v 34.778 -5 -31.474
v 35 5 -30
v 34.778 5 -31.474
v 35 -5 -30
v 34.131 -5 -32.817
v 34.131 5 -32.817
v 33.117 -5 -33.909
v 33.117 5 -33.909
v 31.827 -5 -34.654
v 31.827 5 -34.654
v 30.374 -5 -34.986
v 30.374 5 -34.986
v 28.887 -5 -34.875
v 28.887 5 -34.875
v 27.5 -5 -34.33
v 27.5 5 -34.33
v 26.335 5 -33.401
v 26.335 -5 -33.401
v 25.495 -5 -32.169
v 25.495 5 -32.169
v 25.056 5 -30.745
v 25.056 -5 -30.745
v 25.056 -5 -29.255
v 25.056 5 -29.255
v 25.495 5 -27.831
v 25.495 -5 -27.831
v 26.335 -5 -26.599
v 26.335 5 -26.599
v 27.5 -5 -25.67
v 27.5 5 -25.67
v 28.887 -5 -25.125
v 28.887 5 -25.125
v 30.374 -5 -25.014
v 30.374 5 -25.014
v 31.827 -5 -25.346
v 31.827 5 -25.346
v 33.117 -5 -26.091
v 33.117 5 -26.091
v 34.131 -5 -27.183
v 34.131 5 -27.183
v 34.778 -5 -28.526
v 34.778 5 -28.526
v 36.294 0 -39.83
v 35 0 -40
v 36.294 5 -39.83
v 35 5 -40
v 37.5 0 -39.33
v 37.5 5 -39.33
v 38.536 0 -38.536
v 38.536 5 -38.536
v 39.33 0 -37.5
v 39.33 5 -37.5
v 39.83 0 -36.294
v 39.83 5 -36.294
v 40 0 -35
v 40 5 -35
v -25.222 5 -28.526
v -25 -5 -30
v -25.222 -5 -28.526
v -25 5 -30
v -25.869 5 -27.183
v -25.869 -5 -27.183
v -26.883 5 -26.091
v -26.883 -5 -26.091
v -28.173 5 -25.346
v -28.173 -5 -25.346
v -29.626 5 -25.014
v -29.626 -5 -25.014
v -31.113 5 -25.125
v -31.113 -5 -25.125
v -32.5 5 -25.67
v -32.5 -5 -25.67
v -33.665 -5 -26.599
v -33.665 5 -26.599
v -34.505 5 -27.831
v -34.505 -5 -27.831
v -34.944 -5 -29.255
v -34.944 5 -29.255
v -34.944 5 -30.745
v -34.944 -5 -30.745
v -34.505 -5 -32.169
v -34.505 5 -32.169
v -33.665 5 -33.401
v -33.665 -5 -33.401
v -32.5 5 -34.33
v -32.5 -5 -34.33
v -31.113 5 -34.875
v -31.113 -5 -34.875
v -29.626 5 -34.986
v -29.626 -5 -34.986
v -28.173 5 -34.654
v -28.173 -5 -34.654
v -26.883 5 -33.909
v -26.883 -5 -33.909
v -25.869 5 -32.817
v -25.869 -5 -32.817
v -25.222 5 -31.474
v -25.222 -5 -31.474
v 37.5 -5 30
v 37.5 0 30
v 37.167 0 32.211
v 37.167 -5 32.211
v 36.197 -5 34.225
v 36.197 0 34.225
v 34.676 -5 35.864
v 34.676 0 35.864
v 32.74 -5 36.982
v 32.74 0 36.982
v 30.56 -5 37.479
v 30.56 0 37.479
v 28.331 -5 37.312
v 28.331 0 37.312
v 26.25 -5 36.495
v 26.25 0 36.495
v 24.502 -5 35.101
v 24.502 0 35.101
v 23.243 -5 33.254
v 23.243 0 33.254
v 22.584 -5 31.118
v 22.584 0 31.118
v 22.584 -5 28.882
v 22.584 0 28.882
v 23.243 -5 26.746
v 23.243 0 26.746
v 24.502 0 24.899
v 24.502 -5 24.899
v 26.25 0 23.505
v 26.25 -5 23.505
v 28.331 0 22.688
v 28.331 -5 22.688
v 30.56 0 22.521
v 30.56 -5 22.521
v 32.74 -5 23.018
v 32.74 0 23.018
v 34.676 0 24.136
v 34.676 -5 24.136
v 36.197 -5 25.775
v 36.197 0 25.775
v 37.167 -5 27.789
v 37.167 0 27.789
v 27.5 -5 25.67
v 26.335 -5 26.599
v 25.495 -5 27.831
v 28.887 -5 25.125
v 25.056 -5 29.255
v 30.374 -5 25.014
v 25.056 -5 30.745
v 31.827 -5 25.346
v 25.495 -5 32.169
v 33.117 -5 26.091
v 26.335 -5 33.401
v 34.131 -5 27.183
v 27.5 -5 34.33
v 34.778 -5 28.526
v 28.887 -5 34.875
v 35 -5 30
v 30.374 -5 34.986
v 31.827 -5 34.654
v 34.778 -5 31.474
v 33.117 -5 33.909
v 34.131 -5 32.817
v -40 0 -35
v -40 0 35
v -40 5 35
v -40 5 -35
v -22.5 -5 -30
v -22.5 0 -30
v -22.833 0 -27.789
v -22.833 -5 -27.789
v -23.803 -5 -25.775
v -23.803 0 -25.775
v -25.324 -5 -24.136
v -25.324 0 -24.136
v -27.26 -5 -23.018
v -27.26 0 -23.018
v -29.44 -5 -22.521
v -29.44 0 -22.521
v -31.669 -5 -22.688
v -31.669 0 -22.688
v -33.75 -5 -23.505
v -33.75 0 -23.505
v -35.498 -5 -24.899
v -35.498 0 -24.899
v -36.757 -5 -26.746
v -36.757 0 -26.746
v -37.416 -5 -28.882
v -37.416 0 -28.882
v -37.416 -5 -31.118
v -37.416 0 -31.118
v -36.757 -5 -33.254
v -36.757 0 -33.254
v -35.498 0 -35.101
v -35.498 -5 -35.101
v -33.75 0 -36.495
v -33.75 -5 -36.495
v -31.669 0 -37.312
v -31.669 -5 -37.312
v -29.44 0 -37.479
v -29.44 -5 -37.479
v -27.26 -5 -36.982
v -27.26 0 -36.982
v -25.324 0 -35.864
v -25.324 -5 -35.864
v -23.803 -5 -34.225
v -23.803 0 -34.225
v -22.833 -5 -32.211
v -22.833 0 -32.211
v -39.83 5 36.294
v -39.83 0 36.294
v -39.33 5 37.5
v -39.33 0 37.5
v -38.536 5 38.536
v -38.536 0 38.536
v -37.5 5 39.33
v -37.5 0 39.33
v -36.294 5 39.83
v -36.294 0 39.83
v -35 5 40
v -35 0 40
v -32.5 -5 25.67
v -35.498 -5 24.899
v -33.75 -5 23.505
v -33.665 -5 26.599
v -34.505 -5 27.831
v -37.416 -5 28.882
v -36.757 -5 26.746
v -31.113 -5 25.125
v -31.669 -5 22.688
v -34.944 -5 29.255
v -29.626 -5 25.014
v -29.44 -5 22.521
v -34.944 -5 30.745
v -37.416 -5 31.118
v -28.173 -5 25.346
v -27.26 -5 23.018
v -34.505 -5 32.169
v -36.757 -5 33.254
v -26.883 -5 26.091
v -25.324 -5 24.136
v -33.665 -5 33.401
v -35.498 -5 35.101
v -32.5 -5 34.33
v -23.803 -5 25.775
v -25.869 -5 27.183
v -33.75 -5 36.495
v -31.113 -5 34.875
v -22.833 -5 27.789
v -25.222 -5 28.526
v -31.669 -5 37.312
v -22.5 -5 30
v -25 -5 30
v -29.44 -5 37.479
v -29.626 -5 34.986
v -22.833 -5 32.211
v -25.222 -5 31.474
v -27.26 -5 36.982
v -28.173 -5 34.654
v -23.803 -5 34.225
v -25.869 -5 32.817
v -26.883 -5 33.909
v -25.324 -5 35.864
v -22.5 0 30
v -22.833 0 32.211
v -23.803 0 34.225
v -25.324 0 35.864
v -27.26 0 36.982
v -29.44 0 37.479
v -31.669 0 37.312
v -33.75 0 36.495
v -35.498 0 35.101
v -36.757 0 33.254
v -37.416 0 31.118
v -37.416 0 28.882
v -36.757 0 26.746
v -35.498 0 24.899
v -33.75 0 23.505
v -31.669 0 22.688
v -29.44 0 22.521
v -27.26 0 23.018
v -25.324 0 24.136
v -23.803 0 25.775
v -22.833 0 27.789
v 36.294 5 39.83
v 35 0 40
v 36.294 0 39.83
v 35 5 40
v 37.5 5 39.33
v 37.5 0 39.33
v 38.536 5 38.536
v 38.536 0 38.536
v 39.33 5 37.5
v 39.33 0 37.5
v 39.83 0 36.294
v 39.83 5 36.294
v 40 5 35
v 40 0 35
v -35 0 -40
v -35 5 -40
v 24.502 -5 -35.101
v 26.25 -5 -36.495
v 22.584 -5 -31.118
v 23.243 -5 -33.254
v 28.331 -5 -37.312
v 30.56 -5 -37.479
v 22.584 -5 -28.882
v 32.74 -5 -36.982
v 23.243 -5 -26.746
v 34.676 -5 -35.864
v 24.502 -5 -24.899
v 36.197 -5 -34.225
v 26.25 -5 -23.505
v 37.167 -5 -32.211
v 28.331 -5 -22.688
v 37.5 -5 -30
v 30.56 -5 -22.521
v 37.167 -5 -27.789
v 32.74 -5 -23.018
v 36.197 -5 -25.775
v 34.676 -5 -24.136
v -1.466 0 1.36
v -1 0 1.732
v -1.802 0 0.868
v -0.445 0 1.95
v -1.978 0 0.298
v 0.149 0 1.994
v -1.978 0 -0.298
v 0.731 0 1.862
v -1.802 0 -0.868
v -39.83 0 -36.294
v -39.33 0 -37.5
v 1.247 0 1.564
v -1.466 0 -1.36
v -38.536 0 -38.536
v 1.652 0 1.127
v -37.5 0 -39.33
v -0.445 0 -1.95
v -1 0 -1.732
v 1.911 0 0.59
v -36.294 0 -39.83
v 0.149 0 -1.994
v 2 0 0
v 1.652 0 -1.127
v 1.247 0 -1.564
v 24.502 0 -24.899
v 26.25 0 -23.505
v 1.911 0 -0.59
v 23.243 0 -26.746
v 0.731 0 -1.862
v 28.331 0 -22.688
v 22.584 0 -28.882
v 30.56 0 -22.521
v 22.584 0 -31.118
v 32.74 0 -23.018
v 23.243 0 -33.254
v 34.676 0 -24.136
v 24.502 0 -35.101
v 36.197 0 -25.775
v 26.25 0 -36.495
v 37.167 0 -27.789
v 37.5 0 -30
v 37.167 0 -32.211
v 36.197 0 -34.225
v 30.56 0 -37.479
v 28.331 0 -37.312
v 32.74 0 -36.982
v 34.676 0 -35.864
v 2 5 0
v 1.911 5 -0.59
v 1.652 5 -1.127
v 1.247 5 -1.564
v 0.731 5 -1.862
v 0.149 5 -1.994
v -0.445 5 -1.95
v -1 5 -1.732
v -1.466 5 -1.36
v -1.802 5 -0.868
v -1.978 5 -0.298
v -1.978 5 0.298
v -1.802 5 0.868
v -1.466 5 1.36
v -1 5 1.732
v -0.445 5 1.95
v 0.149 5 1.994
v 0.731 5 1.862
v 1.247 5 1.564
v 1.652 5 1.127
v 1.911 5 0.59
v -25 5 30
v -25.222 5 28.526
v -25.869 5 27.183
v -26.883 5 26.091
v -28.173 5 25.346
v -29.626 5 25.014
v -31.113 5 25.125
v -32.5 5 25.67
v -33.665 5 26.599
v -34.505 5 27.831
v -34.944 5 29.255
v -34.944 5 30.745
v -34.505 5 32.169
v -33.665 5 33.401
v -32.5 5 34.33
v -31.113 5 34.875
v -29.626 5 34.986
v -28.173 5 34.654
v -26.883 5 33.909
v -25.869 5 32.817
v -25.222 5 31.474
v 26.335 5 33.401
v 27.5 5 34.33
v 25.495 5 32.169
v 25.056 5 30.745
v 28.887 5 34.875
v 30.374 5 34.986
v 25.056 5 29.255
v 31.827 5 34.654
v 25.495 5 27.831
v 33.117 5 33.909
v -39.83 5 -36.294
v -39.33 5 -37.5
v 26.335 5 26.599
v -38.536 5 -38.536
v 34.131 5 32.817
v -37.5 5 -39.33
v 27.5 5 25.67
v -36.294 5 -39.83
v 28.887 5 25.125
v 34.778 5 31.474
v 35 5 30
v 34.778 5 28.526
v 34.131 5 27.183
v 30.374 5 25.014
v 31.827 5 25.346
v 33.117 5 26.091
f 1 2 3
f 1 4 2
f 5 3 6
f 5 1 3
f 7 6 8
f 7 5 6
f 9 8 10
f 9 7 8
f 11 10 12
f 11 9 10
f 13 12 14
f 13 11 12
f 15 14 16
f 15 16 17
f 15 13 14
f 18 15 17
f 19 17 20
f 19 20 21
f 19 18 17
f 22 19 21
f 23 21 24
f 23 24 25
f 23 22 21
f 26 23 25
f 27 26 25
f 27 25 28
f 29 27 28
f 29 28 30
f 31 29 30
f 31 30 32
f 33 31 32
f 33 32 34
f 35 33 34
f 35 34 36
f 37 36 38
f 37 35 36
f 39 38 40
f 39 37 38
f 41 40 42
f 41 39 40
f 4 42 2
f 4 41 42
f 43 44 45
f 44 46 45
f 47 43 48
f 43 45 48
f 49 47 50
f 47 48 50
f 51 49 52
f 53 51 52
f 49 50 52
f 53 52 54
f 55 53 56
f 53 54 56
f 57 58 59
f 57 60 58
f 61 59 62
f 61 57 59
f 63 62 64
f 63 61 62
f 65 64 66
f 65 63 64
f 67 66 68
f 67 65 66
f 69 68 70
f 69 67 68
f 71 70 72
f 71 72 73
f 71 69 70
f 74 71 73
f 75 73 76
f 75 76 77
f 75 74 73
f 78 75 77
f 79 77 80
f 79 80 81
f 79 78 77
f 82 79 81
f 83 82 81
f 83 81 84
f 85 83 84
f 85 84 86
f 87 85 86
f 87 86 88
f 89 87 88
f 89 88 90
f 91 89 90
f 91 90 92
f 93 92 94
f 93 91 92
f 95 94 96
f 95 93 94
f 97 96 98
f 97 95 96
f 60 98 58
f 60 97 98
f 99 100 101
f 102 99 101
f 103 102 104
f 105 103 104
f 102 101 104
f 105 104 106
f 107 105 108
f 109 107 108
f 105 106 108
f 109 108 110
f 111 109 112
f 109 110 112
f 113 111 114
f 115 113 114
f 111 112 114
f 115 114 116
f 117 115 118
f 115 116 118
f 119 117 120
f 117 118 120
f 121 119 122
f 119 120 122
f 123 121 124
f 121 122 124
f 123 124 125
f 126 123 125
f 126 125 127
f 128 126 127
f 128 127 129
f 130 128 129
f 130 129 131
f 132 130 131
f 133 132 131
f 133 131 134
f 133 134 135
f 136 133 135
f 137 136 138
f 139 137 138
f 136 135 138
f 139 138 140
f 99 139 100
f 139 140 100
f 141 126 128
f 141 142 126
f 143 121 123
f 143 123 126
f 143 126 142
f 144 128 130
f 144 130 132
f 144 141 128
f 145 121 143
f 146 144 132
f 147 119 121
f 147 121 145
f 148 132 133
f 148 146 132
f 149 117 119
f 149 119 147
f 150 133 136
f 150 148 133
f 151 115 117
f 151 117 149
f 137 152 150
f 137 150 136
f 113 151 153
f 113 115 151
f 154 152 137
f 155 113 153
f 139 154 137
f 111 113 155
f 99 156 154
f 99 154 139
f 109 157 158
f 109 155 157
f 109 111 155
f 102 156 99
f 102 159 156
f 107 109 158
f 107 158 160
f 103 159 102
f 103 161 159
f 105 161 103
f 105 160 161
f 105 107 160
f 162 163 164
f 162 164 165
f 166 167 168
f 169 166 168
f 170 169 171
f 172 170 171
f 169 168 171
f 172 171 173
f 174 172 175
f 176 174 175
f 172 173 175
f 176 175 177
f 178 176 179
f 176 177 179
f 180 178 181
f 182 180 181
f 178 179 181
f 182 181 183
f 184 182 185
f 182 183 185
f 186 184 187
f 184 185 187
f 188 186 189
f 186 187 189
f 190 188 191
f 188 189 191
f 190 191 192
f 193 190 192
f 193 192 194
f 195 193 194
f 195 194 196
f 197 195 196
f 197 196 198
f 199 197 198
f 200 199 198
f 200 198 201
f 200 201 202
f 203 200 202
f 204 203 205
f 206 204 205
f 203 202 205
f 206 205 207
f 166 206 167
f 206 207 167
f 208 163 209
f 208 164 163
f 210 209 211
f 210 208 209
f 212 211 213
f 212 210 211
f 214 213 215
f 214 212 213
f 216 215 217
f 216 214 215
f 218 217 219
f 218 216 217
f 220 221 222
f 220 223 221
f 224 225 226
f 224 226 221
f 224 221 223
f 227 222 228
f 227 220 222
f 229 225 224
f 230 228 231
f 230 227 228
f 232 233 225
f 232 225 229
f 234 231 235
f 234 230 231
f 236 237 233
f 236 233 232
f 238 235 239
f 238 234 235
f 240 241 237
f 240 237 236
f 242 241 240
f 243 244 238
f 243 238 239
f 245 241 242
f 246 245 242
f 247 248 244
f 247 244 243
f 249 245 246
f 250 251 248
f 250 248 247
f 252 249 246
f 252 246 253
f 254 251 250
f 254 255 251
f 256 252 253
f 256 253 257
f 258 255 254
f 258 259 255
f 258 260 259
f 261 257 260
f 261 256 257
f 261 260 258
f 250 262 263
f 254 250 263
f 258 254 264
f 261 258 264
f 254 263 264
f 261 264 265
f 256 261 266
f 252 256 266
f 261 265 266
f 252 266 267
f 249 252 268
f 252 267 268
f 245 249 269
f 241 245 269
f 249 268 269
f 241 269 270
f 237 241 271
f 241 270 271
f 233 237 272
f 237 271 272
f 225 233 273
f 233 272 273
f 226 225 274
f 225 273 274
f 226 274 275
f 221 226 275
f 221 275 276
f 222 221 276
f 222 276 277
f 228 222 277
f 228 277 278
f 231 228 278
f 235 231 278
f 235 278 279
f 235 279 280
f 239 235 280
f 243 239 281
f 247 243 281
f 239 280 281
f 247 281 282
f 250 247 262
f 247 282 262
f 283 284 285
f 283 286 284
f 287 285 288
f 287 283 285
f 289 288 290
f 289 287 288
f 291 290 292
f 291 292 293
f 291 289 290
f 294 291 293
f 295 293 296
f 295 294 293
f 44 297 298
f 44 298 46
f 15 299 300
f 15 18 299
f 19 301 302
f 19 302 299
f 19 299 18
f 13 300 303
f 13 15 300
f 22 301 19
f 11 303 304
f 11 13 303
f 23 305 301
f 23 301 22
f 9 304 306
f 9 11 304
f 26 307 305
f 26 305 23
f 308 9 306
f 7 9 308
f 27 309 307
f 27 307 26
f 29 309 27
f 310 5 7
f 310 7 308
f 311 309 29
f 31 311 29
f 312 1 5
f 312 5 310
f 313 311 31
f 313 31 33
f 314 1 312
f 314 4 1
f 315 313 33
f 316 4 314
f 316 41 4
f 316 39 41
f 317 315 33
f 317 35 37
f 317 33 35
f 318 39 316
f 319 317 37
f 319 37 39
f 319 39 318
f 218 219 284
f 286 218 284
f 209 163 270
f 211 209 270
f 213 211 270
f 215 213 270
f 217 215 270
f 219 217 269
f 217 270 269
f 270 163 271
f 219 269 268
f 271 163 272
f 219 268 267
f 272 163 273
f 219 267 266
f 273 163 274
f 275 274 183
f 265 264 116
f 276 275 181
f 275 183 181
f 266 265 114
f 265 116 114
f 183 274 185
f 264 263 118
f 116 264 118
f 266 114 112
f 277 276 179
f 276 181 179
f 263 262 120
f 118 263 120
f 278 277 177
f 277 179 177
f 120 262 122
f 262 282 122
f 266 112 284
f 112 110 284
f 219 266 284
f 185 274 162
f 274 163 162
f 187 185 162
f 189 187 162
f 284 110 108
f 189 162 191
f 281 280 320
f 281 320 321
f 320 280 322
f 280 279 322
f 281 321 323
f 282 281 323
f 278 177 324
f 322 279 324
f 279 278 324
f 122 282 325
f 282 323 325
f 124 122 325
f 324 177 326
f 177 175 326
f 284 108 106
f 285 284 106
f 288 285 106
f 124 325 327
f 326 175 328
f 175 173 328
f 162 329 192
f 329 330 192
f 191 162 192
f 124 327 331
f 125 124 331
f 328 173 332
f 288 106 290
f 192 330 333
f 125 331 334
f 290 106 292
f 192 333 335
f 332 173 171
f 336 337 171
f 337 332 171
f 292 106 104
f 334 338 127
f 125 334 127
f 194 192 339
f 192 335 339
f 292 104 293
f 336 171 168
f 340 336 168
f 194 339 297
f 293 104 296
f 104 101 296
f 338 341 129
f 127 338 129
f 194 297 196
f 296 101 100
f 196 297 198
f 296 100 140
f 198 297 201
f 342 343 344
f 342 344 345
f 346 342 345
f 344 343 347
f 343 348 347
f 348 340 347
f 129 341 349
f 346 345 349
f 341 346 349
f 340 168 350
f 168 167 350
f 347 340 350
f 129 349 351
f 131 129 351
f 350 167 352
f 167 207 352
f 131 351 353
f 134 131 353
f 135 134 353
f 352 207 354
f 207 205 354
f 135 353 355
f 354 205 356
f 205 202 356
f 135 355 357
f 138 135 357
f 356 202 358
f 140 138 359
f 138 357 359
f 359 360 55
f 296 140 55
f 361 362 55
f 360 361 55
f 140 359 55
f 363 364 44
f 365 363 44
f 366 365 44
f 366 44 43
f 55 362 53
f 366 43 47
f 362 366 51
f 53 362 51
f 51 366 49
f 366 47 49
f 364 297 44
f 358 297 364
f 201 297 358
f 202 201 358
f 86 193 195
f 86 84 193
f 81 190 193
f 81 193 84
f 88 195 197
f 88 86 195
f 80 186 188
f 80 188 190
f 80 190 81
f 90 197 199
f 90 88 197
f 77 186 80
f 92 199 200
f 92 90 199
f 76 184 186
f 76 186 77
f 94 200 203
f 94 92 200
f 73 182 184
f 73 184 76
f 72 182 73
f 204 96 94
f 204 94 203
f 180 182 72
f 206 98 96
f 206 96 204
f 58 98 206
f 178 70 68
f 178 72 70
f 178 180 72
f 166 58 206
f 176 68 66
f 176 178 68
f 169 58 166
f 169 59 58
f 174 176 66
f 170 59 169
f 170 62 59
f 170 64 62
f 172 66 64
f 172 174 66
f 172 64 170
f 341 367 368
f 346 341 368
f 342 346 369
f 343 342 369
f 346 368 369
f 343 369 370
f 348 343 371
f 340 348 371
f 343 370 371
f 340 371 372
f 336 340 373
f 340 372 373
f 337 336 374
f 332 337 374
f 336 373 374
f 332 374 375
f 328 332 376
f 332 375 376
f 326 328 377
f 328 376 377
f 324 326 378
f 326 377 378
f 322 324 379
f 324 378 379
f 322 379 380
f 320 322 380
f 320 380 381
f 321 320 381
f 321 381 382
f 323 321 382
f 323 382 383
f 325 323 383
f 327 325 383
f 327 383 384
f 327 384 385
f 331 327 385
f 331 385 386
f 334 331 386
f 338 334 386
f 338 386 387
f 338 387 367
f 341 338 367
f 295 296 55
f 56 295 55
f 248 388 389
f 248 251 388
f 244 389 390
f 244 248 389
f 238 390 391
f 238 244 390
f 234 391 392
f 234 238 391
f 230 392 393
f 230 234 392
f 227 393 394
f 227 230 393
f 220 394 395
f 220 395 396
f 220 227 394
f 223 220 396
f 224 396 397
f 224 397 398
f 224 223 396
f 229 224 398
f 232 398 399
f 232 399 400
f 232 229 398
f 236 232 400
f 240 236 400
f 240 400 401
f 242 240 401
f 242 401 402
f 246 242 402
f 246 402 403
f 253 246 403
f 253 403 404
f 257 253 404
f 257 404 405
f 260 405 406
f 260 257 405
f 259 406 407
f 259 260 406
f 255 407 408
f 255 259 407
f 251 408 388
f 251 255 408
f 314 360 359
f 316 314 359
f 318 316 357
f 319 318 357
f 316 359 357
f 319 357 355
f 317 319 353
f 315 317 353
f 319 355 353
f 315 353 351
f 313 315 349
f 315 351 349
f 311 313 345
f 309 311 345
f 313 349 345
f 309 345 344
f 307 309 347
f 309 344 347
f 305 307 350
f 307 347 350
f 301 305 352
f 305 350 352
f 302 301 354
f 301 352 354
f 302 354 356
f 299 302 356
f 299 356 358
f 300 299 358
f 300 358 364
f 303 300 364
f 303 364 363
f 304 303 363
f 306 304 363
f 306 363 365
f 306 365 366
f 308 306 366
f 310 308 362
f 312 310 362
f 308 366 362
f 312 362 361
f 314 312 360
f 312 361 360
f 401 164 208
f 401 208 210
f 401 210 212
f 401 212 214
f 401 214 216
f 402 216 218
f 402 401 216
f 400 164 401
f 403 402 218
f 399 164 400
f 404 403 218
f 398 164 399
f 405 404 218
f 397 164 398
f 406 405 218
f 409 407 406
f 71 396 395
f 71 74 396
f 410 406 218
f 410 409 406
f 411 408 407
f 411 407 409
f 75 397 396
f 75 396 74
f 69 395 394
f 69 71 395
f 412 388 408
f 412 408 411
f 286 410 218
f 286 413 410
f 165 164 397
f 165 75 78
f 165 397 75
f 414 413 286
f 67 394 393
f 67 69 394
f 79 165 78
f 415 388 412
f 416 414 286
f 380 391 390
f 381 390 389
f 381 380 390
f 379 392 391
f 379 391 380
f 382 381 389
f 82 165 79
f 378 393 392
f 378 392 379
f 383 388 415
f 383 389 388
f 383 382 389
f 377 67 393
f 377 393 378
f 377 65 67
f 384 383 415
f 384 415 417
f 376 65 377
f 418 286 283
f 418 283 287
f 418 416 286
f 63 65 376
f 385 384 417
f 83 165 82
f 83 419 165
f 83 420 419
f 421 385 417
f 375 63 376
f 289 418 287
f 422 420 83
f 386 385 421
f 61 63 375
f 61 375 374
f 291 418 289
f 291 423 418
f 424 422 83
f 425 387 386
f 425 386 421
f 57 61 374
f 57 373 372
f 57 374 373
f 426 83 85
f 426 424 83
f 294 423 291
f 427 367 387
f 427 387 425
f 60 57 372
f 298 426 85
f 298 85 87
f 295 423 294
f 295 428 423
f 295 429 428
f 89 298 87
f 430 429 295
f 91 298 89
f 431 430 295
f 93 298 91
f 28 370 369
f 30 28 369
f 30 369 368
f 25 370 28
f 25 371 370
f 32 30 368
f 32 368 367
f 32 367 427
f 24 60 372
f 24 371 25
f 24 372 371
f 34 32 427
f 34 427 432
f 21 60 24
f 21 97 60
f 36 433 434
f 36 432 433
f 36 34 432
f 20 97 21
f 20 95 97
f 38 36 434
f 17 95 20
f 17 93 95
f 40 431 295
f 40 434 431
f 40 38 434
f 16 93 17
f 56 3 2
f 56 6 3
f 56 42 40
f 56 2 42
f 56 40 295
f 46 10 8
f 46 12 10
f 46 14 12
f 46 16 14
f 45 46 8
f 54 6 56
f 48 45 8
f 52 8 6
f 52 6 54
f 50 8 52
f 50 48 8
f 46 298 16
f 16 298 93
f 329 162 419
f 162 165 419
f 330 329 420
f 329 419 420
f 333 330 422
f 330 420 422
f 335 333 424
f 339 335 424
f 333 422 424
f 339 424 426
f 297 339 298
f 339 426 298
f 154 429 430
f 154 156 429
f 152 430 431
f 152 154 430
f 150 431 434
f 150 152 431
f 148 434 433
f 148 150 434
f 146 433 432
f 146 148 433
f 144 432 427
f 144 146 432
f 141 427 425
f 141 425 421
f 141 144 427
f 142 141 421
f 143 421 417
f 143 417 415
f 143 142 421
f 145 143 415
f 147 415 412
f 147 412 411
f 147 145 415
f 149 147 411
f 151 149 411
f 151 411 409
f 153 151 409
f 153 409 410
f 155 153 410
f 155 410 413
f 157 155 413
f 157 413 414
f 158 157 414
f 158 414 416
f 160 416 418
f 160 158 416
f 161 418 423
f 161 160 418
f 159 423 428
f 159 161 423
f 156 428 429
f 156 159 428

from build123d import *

# Parameters (mm, degrees)
SKETCH1_W           = 80
SKETCH1_H           = 80
SKETCH1_R           = 5
BOSS_EXTRUDE1_DEPTH = 5
SKETCH2_R           = 7.5
SKETCH2_R_2         = 5
EXTRUDE_THIN1_DEPTH = 5
SKETCH3_R           = 2
CUT_EXTRUDE1_DEPTH  = 11
FILLET1_R           = 5


with BuildPart() as part:
    # Sketch1 → Boss-Extrude1 (new body)
    with BuildSketch(Plane(origin=(0, 0, 0), x_dir=(1, 0, 0), z_dir=(0, 1, 0))):
        Rectangle(SKETCH1_W, SKETCH1_H)
        with Locations((-30, 30)):
            Circle(SKETCH1_R, mode=Mode.SUBTRACT)
        with Locations((30, 30)):
            Circle(SKETCH1_R, mode=Mode.SUBTRACT)
        with Locations((30, -30)):
            Circle(SKETCH1_R, mode=Mode.SUBTRACT)
        with Locations((-30, -30)):
            Circle(SKETCH1_R, mode=Mode.SUBTRACT)
    extrude(amount=BOSS_EXTRUDE1_DEPTH)

    # Sketch2 → Extrude-Thin1 (add)
    with BuildSketch(Plane.XZ):
        with Locations((-30, -30)):
            Circle(SKETCH2_R)
        with Locations((-30, -30)):
            Circle(SKETCH2_R_2, mode=Mode.SUBTRACT)
        with Locations((30, -30)):
            Circle(SKETCH2_R)
        with Locations((30, -30)):
            Circle(SKETCH2_R_2, mode=Mode.SUBTRACT)
        with Locations((30, 30)):
            Circle(SKETCH2_R)
        with Locations((30, 30)):
            Circle(SKETCH2_R_2, mode=Mode.SUBTRACT)
        with Locations((-30, 30)):
            Circle(SKETCH2_R)
        with Locations((-30, 30)):
            Circle(SKETCH2_R_2, mode=Mode.SUBTRACT)
    extrude(amount=EXTRUDE_THIN1_DEPTH)

    # Sketch3 → Cut-Extrude1 (cut, through all)
    with BuildSketch(Plane(origin=(0, 5, 0), x_dir=(1, 0, 0), z_dir=(0, 1, 0))):
        Circle(SKETCH3_R)
    extrude(amount=-CUT_EXTRUDE1_DEPTH, mode=Mode.SUBTRACT)

    # Fillet1
    fillet1_edges = [part.edges().sort_by_distance(p)[0] for p in [
        (40, 2.5, 40),
        (-40, 2.5, 40),
        (-40, 2.5, -40),
        (40, 2.5, -40),
    ]]
    fillet(fillet1_edges, radius=FILLET1_R)


solid = part.part
